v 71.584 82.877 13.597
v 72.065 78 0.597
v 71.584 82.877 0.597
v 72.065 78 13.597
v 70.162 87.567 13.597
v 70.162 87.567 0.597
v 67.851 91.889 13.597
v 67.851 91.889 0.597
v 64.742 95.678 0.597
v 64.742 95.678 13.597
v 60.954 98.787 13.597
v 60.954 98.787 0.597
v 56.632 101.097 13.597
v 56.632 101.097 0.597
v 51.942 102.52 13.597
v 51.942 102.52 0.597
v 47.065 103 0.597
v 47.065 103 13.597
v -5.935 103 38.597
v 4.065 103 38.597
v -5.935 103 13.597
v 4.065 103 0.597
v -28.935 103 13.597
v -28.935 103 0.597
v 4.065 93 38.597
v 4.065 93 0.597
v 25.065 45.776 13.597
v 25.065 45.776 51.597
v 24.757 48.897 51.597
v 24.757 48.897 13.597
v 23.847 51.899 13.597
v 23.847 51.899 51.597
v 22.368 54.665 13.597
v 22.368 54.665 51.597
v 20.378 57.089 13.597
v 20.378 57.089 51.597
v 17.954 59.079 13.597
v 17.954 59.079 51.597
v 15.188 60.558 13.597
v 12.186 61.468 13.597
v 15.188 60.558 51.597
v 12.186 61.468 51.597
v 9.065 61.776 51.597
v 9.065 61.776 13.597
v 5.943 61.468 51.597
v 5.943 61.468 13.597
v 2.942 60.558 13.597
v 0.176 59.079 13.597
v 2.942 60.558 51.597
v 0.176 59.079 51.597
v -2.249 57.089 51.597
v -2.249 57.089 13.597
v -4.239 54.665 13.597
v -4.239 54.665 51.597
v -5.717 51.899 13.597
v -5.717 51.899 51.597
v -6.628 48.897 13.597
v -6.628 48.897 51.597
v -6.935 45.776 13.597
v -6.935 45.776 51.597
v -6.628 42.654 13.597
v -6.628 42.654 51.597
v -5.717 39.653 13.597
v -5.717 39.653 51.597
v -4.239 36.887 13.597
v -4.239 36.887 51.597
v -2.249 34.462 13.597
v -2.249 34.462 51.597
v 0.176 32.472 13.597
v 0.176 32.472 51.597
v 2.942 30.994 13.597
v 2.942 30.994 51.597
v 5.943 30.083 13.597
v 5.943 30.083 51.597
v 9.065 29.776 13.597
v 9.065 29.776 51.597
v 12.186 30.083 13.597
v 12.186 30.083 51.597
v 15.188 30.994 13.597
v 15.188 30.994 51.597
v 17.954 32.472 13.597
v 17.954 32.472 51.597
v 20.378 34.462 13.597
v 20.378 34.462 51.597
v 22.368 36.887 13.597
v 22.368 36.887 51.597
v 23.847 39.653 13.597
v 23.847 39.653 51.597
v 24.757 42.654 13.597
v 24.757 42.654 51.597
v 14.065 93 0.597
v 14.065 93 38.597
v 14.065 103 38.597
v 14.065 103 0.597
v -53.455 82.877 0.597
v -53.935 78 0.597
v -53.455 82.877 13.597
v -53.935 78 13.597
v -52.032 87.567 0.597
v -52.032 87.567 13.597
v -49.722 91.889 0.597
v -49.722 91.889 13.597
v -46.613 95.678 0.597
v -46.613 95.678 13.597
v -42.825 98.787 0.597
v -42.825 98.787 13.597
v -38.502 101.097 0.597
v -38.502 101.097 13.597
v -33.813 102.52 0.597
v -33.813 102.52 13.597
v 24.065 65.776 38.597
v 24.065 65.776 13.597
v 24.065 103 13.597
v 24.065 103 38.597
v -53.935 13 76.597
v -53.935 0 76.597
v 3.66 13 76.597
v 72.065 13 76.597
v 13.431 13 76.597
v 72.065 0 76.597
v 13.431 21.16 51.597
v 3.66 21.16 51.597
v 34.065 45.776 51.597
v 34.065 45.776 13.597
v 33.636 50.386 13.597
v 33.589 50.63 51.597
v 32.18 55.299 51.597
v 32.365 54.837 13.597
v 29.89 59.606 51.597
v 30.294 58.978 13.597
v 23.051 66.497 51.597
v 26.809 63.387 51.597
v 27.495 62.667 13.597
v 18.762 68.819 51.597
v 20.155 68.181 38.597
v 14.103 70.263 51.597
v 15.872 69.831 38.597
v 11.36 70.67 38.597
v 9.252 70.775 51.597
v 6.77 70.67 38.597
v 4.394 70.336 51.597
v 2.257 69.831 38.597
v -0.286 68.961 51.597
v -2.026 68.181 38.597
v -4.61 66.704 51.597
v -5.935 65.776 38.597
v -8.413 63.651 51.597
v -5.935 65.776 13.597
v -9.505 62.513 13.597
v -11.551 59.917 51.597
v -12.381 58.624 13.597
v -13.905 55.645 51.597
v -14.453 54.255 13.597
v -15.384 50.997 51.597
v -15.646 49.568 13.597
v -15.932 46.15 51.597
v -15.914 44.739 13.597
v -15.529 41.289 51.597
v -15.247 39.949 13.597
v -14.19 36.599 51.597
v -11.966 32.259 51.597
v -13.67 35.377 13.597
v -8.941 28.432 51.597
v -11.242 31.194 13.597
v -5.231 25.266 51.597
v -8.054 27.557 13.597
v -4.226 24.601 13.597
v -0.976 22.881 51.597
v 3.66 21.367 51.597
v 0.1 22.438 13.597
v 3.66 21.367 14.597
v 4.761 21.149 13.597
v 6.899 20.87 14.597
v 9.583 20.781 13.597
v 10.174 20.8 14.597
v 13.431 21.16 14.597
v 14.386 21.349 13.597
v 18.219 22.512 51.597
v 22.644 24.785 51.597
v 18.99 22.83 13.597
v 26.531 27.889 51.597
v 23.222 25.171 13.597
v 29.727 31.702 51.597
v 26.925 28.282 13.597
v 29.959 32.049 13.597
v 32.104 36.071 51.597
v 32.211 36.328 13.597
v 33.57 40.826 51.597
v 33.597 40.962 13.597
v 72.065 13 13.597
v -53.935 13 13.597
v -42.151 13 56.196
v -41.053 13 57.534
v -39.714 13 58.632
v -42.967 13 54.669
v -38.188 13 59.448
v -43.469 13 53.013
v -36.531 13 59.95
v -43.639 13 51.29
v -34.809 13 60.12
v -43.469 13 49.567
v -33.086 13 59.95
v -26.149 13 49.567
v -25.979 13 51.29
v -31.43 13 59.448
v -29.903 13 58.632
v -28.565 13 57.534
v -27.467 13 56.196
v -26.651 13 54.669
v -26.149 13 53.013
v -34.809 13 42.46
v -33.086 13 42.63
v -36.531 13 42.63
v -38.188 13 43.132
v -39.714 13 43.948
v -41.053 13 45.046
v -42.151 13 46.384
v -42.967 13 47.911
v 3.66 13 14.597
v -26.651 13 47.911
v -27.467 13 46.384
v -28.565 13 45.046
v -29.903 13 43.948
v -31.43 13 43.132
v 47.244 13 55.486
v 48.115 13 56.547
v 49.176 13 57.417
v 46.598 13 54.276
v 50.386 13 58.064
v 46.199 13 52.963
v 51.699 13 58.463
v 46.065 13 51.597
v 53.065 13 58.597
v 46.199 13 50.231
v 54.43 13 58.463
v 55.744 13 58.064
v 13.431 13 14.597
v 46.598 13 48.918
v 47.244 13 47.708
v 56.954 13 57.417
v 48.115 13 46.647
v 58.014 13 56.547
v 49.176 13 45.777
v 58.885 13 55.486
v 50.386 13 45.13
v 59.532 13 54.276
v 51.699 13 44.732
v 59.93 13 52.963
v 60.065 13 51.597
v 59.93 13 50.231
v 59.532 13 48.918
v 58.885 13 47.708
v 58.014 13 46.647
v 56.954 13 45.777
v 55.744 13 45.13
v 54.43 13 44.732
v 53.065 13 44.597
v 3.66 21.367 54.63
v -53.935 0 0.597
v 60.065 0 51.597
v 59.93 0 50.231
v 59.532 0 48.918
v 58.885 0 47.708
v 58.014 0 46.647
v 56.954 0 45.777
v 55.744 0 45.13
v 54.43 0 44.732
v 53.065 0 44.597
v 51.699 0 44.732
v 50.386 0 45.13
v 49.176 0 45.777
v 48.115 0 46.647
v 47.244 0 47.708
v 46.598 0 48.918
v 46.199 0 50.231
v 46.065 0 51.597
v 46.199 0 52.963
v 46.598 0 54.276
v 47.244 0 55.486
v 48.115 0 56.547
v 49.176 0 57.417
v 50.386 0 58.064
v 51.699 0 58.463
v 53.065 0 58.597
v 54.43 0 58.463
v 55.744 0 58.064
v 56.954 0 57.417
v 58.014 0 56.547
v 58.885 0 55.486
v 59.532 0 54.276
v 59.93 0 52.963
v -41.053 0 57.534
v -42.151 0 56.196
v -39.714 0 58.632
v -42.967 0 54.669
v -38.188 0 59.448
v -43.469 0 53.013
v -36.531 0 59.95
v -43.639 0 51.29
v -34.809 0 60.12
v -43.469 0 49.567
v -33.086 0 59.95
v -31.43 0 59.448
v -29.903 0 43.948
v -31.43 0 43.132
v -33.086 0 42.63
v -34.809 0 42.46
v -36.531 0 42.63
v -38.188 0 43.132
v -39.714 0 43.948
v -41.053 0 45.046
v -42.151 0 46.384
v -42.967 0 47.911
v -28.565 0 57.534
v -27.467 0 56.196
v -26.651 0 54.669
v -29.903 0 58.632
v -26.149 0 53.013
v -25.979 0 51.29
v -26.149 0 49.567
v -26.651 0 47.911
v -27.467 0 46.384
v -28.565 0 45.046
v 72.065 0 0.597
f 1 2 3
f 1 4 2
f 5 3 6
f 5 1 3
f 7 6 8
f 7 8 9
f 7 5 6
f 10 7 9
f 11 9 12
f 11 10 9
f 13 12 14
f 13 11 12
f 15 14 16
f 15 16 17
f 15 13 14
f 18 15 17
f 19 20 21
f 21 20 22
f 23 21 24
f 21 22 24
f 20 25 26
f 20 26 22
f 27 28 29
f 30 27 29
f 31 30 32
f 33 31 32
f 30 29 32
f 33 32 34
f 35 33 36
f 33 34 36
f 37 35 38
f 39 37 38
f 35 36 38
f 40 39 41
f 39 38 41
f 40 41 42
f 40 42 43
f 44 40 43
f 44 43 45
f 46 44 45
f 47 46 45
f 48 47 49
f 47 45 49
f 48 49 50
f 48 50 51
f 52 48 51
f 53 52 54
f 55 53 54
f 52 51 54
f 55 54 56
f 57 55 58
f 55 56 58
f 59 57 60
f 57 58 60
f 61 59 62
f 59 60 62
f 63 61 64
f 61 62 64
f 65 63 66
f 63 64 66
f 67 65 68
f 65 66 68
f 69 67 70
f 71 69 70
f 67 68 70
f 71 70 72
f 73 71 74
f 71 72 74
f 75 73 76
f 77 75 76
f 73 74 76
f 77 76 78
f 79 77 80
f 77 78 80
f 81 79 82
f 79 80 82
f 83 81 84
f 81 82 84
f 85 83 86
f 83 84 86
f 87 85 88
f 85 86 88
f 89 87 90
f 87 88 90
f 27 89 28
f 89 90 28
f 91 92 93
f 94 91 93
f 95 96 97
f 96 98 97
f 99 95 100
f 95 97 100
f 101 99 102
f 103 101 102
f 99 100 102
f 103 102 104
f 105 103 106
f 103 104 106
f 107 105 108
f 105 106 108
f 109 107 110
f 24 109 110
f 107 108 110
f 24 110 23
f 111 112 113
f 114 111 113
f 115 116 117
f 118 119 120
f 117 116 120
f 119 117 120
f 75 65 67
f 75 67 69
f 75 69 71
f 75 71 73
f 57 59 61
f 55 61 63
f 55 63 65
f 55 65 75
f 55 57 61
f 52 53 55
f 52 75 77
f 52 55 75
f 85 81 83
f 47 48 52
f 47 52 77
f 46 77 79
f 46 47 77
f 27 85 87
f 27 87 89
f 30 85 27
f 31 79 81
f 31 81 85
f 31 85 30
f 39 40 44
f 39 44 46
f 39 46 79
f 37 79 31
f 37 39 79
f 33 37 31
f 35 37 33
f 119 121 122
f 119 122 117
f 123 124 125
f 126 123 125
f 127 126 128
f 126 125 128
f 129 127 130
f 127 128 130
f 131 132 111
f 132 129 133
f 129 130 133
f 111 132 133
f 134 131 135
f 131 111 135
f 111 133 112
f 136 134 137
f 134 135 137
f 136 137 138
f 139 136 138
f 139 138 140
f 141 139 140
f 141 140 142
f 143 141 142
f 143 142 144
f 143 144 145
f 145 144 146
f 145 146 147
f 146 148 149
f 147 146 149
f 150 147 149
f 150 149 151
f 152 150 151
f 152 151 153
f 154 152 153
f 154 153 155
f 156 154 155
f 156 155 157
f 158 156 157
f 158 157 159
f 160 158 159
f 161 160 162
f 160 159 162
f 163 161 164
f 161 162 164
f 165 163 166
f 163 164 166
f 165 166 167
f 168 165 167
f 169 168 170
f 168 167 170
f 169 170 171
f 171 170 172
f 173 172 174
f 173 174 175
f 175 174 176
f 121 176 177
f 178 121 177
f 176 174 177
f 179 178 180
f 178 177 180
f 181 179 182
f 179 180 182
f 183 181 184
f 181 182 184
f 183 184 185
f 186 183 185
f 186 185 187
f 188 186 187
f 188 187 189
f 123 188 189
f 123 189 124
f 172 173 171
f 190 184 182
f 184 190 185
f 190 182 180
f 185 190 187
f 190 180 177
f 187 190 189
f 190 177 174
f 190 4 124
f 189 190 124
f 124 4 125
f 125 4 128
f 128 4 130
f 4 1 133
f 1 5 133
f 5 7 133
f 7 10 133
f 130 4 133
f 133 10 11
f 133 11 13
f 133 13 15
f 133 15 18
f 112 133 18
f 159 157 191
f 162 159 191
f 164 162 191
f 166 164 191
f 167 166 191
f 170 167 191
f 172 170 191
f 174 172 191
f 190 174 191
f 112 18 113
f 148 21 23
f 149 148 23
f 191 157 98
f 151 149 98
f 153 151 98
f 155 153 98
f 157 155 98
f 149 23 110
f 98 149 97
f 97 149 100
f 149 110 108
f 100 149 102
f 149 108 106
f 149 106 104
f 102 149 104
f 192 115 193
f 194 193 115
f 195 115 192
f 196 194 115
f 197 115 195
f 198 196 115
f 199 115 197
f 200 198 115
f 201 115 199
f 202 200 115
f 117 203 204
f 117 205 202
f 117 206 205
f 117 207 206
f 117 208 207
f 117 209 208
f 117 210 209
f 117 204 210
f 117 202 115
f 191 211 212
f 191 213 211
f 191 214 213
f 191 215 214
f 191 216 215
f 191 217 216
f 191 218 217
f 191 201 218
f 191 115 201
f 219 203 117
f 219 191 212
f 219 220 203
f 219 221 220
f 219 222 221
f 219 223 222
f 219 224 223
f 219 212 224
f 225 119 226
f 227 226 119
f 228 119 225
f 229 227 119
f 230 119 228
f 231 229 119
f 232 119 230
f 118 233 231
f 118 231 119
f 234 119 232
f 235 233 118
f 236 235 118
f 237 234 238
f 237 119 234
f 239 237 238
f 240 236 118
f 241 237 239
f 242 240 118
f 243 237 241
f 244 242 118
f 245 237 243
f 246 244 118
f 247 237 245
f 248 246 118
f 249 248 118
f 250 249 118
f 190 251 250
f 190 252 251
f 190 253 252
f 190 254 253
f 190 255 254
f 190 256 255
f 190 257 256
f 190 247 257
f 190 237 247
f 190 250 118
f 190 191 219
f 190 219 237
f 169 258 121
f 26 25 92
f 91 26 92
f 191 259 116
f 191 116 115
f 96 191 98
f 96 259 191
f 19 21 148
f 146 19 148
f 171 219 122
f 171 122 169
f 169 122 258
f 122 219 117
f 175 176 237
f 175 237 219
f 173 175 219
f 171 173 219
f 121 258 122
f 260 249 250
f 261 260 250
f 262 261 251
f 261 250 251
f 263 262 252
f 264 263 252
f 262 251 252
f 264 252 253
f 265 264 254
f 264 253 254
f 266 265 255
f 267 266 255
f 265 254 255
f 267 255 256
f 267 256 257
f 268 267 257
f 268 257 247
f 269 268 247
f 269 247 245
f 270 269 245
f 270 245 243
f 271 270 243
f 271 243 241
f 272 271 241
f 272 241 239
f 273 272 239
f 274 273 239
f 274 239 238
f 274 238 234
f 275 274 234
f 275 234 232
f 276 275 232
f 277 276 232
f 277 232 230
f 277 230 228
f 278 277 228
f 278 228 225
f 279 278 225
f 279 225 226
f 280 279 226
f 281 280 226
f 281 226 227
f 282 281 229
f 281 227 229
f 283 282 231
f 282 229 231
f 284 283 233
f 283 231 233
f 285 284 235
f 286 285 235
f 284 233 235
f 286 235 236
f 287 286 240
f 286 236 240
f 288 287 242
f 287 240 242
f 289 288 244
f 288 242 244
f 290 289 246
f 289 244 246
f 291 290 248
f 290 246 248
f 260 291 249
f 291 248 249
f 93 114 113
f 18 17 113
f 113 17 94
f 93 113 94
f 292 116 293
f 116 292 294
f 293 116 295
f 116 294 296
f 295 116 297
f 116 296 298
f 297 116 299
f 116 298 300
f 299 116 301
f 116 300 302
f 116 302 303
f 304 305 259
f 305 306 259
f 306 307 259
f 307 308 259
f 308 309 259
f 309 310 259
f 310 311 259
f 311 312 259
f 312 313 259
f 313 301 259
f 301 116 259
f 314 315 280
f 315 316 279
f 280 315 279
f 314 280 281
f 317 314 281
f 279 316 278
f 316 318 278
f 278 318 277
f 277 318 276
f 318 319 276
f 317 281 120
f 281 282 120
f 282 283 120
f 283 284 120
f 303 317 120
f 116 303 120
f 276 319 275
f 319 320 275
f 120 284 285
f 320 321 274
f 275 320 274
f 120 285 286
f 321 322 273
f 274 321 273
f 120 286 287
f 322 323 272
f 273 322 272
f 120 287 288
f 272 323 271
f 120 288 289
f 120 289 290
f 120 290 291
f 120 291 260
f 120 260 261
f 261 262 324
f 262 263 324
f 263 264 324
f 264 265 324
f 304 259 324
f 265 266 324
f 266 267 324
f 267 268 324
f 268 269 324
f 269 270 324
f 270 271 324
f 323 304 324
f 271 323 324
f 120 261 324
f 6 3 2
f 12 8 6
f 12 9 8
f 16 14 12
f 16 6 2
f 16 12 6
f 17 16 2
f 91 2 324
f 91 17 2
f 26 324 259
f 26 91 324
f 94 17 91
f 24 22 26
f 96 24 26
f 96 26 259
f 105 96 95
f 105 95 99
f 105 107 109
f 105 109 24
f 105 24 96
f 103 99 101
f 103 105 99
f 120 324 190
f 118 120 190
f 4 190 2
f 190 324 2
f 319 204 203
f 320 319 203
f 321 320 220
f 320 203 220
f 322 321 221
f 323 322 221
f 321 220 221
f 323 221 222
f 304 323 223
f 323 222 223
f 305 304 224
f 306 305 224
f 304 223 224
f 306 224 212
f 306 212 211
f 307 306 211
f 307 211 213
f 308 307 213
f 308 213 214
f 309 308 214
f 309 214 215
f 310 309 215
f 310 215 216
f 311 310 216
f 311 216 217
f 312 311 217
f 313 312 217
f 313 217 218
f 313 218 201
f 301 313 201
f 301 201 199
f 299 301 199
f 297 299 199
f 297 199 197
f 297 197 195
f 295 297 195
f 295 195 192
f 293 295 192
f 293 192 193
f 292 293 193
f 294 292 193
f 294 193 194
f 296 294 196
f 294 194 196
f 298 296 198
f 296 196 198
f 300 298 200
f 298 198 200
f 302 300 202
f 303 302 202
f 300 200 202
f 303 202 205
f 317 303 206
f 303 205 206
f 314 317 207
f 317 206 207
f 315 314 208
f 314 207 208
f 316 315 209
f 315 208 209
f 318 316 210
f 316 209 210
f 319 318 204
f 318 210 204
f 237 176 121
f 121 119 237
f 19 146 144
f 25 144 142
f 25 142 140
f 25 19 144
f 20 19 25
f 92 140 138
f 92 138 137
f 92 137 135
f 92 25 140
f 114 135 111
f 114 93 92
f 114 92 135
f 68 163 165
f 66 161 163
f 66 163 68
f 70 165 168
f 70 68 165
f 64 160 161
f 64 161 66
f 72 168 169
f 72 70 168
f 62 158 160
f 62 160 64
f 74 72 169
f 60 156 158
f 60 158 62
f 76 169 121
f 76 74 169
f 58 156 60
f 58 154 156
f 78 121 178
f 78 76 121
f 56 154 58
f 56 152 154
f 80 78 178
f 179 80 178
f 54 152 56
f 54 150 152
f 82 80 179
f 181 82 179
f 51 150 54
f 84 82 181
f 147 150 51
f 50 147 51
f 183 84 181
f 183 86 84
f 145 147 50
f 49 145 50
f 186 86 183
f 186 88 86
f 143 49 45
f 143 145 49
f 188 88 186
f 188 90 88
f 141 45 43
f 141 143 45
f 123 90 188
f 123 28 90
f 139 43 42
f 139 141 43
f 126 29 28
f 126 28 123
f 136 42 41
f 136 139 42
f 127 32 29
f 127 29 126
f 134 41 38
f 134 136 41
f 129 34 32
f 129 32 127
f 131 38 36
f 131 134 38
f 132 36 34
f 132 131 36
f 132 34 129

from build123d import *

# Parameters (mm, degrees)
SKETCH1_W            = 126
SKETCH1_H            = 76
BOSS_EXTRUDE1_DEPTH  = 13
SKETCH2_W            = 126
SKETCH2_H            = 90
BOSS_EXTRUDE2_DEPTH  = 13
FILLET1_R            = 25
SKETCH3_W            = 10
SKETCH3_H            = 25.459891015
BOSS_EXTRUDE3_DEPTH  = 10
SKETCH4_W            = 10
SKETCH4_H            = 13
CUT_EXTRUDE1_DEPTH   = 10
SKETCH8_R            = 25
BOSS_EXTRUDE4_DEPTH  = 38
SKETCH10_R           = 16
CUT_EXTRUDE3_DEPTH   = 38
BOSS_EXTRUDE8_DEPTH  = 25
SKETCH12_W           = 10
SKETCH12_H           = 10
CUT_EXTRUDE4_DEPTH   = 45
SKETCH13_R           = 8.829907476
CUT_EXTRUDE5_DEPTH   = 14
SKETCH14_R           = 7
CUT_EXTRUDE6_DEPTH   = 34
BOSS_EXTRUDE11_DEPTH = 37
CUT_EXTRUDE7_DEPTH   = 37


with BuildPart() as part:
    # Sketch1 → Boss-Extrude1 (new body)
    with BuildSketch(Plane(origin=(0, 0, 0), x_dir=(1, 0, 0), z_dir=(0, 1, 0))):
        with Locations((9.064748201, -38.597122302)):
            Rectangle(SKETCH1_W, SKETCH1_H)
    extrude(amount=BOSS_EXTRUDE1_DEPTH)

    # Sketch2 → Boss-Extrude2 (add)
    with BuildSketch(Plane(origin=(0, 0, 0.597122302), x_dir=(-1, 0, 0), z_dir=(0, 0, -1))):
        with Locations((-9.064748201, 58)):
            Rectangle(SKETCH2_W, SKETCH2_H)
    extrude(amount=-BOSS_EXTRUDE2_DEPTH)

    # Fillet1
    fillet1_edges = [part.edges().sort_by_distance(p)[0] for p in [
        (72.064748201, 103, 7.097122302),
        (-53.935251799, 103, 7.097122302),
    ]]
    fillet(fillet1_edges, radius=FILLET1_R)

    # Sketch3 → Boss-Extrude3 (add)
    with BuildSketch(Plane(origin=(0, 103, 0), x_dir=(1, 0, 0), z_dir=(0, 1, 0))):
        with Locations((9.064748201, -26.32706781)):
            Rectangle(SKETCH3_W, SKETCH3_H)
    extrude(amount=-BOSS_EXTRUDE3_DEPTH)

    # Sketch4 → Cut-Extrude1 (cut)
    with BuildSketch(Plane(origin=(0, 103, 0), x_dir=(1, 0, 0), z_dir=(0, 1, 0))):
        with Locations((9.064748201, -7.097122302)):
            Rectangle(SKETCH4_W, SKETCH4_H)
    extrude(amount=-CUT_EXTRUDE1_DEPTH, mode=Mode.SUBTRACT)

    # Sketch8 → Boss-Extrude4 (add)
    with BuildSketch(Plane.XY.offset(13.597122302)):
        with Locations((9.064748201, 45.775653821)):
            Circle(SKETCH8_R)
    extrude(amount=BOSS_EXTRUDE4_DEPTH)

    # Sketch10 → Cut-Extrude3 (cut)
    with BuildSketch(Plane.XY.offset(51.597122302)):
        with Locations((9.064748201, 45.775653821)):
            Circle(SKETCH10_R)
    extrude(amount=-CUT_EXTRUDE3_DEPTH, mode=Mode.SUBTRACT)

    # Sketch11 → Boss-Extrude8 (add)
    with BuildSketch(Plane.XY.offset(13.597122302)):
        with BuildLine():
            Line((4.064748201, 103), (-5.935251799, 103))
            Line((-5.935251799, 103), (-5.935251799, 65.775653821))
            ThreePointArc((-5.935251799, 65.775653821), (9.064748201, 70.775653821), (24.064748201, 65.775653821))
            Line((24.064748201, 65.775653821), (24.064748201, 103))
            Line((24.064748201, 103), (14.064748201, 103))
            Line((14.064748201, 103), (14.064748201, 93))
            Line((14.064748201, 93), (4.064748201, 93))
            Line((4.064748201, 93), (4.064748201, 103))
        make_face()
    extrude(amount=BOSS_EXTRUDE8_DEPTH)

    # Sketch12 → Cut-Extrude4 (cut)
    with BuildSketch(Plane.XY.offset(39.057013317)):
        with Locations((9.064748201, 98)):
            Rectangle(SKETCH12_W, SKETCH12_H)
    extrude(amount=-CUT_EXTRUDE4_DEPTH, mode=Mode.SUBTRACT)

    # Sketch13 → Cut-Extrude5 (cut)
    with BuildSketch(Plane(origin=(0, 13, 0), x_dir=(1, 0, 0), z_dir=(0, 1, 0))):
        with Locations((-34.808854568, -51.290114298)):
            Circle(SKETCH13_R)
    extrude(amount=-CUT_EXTRUDE5_DEPTH, mode=Mode.SUBTRACT)

    # Sketch14 → Cut-Extrude6 (cut)
    with BuildSketch(Plane(origin=(0, 13, 0), x_dir=(1, 0, 0), z_dir=(0, 1, 0))):
        with Locations((53.064748201, -51.597122302)):
            Circle(SKETCH14_R)
    extrude(amount=-CUT_EXTRUDE6_DEPTH, mode=Mode.SUBTRACT)

    # Sketch17 → Boss-Extrude11 (add, symmetric)
    with BuildSketch(Plane.XY.offset(51.597122302)):
        Polygon((3.660374399, 21.366787731), (13.431056495, 21.159899681), (13.431056495, 13), (3.660374399, 13), align=None)
    extrude(amount=BOSS_EXTRUDE11_DEPTH, both=True)

    # Sketch18 → Cut-Extrude7 (cut, symmetric)
    with BuildSketch(Plane(origin=(13.431056495, 0, 0), x_dir=(0, 0, -1), z_dir=(1, 0, 0))):
        Polygon((-51.597122302, 21.159899681), (-76.597122302, 13), (-88.597122302, 13), (-88.597122302, 23.683887041), align=None)
    extrude(amount=CUT_EXTRUDE7_DEPTH, both=True, mode=Mode.SUBTRACT)


solid = part.part
